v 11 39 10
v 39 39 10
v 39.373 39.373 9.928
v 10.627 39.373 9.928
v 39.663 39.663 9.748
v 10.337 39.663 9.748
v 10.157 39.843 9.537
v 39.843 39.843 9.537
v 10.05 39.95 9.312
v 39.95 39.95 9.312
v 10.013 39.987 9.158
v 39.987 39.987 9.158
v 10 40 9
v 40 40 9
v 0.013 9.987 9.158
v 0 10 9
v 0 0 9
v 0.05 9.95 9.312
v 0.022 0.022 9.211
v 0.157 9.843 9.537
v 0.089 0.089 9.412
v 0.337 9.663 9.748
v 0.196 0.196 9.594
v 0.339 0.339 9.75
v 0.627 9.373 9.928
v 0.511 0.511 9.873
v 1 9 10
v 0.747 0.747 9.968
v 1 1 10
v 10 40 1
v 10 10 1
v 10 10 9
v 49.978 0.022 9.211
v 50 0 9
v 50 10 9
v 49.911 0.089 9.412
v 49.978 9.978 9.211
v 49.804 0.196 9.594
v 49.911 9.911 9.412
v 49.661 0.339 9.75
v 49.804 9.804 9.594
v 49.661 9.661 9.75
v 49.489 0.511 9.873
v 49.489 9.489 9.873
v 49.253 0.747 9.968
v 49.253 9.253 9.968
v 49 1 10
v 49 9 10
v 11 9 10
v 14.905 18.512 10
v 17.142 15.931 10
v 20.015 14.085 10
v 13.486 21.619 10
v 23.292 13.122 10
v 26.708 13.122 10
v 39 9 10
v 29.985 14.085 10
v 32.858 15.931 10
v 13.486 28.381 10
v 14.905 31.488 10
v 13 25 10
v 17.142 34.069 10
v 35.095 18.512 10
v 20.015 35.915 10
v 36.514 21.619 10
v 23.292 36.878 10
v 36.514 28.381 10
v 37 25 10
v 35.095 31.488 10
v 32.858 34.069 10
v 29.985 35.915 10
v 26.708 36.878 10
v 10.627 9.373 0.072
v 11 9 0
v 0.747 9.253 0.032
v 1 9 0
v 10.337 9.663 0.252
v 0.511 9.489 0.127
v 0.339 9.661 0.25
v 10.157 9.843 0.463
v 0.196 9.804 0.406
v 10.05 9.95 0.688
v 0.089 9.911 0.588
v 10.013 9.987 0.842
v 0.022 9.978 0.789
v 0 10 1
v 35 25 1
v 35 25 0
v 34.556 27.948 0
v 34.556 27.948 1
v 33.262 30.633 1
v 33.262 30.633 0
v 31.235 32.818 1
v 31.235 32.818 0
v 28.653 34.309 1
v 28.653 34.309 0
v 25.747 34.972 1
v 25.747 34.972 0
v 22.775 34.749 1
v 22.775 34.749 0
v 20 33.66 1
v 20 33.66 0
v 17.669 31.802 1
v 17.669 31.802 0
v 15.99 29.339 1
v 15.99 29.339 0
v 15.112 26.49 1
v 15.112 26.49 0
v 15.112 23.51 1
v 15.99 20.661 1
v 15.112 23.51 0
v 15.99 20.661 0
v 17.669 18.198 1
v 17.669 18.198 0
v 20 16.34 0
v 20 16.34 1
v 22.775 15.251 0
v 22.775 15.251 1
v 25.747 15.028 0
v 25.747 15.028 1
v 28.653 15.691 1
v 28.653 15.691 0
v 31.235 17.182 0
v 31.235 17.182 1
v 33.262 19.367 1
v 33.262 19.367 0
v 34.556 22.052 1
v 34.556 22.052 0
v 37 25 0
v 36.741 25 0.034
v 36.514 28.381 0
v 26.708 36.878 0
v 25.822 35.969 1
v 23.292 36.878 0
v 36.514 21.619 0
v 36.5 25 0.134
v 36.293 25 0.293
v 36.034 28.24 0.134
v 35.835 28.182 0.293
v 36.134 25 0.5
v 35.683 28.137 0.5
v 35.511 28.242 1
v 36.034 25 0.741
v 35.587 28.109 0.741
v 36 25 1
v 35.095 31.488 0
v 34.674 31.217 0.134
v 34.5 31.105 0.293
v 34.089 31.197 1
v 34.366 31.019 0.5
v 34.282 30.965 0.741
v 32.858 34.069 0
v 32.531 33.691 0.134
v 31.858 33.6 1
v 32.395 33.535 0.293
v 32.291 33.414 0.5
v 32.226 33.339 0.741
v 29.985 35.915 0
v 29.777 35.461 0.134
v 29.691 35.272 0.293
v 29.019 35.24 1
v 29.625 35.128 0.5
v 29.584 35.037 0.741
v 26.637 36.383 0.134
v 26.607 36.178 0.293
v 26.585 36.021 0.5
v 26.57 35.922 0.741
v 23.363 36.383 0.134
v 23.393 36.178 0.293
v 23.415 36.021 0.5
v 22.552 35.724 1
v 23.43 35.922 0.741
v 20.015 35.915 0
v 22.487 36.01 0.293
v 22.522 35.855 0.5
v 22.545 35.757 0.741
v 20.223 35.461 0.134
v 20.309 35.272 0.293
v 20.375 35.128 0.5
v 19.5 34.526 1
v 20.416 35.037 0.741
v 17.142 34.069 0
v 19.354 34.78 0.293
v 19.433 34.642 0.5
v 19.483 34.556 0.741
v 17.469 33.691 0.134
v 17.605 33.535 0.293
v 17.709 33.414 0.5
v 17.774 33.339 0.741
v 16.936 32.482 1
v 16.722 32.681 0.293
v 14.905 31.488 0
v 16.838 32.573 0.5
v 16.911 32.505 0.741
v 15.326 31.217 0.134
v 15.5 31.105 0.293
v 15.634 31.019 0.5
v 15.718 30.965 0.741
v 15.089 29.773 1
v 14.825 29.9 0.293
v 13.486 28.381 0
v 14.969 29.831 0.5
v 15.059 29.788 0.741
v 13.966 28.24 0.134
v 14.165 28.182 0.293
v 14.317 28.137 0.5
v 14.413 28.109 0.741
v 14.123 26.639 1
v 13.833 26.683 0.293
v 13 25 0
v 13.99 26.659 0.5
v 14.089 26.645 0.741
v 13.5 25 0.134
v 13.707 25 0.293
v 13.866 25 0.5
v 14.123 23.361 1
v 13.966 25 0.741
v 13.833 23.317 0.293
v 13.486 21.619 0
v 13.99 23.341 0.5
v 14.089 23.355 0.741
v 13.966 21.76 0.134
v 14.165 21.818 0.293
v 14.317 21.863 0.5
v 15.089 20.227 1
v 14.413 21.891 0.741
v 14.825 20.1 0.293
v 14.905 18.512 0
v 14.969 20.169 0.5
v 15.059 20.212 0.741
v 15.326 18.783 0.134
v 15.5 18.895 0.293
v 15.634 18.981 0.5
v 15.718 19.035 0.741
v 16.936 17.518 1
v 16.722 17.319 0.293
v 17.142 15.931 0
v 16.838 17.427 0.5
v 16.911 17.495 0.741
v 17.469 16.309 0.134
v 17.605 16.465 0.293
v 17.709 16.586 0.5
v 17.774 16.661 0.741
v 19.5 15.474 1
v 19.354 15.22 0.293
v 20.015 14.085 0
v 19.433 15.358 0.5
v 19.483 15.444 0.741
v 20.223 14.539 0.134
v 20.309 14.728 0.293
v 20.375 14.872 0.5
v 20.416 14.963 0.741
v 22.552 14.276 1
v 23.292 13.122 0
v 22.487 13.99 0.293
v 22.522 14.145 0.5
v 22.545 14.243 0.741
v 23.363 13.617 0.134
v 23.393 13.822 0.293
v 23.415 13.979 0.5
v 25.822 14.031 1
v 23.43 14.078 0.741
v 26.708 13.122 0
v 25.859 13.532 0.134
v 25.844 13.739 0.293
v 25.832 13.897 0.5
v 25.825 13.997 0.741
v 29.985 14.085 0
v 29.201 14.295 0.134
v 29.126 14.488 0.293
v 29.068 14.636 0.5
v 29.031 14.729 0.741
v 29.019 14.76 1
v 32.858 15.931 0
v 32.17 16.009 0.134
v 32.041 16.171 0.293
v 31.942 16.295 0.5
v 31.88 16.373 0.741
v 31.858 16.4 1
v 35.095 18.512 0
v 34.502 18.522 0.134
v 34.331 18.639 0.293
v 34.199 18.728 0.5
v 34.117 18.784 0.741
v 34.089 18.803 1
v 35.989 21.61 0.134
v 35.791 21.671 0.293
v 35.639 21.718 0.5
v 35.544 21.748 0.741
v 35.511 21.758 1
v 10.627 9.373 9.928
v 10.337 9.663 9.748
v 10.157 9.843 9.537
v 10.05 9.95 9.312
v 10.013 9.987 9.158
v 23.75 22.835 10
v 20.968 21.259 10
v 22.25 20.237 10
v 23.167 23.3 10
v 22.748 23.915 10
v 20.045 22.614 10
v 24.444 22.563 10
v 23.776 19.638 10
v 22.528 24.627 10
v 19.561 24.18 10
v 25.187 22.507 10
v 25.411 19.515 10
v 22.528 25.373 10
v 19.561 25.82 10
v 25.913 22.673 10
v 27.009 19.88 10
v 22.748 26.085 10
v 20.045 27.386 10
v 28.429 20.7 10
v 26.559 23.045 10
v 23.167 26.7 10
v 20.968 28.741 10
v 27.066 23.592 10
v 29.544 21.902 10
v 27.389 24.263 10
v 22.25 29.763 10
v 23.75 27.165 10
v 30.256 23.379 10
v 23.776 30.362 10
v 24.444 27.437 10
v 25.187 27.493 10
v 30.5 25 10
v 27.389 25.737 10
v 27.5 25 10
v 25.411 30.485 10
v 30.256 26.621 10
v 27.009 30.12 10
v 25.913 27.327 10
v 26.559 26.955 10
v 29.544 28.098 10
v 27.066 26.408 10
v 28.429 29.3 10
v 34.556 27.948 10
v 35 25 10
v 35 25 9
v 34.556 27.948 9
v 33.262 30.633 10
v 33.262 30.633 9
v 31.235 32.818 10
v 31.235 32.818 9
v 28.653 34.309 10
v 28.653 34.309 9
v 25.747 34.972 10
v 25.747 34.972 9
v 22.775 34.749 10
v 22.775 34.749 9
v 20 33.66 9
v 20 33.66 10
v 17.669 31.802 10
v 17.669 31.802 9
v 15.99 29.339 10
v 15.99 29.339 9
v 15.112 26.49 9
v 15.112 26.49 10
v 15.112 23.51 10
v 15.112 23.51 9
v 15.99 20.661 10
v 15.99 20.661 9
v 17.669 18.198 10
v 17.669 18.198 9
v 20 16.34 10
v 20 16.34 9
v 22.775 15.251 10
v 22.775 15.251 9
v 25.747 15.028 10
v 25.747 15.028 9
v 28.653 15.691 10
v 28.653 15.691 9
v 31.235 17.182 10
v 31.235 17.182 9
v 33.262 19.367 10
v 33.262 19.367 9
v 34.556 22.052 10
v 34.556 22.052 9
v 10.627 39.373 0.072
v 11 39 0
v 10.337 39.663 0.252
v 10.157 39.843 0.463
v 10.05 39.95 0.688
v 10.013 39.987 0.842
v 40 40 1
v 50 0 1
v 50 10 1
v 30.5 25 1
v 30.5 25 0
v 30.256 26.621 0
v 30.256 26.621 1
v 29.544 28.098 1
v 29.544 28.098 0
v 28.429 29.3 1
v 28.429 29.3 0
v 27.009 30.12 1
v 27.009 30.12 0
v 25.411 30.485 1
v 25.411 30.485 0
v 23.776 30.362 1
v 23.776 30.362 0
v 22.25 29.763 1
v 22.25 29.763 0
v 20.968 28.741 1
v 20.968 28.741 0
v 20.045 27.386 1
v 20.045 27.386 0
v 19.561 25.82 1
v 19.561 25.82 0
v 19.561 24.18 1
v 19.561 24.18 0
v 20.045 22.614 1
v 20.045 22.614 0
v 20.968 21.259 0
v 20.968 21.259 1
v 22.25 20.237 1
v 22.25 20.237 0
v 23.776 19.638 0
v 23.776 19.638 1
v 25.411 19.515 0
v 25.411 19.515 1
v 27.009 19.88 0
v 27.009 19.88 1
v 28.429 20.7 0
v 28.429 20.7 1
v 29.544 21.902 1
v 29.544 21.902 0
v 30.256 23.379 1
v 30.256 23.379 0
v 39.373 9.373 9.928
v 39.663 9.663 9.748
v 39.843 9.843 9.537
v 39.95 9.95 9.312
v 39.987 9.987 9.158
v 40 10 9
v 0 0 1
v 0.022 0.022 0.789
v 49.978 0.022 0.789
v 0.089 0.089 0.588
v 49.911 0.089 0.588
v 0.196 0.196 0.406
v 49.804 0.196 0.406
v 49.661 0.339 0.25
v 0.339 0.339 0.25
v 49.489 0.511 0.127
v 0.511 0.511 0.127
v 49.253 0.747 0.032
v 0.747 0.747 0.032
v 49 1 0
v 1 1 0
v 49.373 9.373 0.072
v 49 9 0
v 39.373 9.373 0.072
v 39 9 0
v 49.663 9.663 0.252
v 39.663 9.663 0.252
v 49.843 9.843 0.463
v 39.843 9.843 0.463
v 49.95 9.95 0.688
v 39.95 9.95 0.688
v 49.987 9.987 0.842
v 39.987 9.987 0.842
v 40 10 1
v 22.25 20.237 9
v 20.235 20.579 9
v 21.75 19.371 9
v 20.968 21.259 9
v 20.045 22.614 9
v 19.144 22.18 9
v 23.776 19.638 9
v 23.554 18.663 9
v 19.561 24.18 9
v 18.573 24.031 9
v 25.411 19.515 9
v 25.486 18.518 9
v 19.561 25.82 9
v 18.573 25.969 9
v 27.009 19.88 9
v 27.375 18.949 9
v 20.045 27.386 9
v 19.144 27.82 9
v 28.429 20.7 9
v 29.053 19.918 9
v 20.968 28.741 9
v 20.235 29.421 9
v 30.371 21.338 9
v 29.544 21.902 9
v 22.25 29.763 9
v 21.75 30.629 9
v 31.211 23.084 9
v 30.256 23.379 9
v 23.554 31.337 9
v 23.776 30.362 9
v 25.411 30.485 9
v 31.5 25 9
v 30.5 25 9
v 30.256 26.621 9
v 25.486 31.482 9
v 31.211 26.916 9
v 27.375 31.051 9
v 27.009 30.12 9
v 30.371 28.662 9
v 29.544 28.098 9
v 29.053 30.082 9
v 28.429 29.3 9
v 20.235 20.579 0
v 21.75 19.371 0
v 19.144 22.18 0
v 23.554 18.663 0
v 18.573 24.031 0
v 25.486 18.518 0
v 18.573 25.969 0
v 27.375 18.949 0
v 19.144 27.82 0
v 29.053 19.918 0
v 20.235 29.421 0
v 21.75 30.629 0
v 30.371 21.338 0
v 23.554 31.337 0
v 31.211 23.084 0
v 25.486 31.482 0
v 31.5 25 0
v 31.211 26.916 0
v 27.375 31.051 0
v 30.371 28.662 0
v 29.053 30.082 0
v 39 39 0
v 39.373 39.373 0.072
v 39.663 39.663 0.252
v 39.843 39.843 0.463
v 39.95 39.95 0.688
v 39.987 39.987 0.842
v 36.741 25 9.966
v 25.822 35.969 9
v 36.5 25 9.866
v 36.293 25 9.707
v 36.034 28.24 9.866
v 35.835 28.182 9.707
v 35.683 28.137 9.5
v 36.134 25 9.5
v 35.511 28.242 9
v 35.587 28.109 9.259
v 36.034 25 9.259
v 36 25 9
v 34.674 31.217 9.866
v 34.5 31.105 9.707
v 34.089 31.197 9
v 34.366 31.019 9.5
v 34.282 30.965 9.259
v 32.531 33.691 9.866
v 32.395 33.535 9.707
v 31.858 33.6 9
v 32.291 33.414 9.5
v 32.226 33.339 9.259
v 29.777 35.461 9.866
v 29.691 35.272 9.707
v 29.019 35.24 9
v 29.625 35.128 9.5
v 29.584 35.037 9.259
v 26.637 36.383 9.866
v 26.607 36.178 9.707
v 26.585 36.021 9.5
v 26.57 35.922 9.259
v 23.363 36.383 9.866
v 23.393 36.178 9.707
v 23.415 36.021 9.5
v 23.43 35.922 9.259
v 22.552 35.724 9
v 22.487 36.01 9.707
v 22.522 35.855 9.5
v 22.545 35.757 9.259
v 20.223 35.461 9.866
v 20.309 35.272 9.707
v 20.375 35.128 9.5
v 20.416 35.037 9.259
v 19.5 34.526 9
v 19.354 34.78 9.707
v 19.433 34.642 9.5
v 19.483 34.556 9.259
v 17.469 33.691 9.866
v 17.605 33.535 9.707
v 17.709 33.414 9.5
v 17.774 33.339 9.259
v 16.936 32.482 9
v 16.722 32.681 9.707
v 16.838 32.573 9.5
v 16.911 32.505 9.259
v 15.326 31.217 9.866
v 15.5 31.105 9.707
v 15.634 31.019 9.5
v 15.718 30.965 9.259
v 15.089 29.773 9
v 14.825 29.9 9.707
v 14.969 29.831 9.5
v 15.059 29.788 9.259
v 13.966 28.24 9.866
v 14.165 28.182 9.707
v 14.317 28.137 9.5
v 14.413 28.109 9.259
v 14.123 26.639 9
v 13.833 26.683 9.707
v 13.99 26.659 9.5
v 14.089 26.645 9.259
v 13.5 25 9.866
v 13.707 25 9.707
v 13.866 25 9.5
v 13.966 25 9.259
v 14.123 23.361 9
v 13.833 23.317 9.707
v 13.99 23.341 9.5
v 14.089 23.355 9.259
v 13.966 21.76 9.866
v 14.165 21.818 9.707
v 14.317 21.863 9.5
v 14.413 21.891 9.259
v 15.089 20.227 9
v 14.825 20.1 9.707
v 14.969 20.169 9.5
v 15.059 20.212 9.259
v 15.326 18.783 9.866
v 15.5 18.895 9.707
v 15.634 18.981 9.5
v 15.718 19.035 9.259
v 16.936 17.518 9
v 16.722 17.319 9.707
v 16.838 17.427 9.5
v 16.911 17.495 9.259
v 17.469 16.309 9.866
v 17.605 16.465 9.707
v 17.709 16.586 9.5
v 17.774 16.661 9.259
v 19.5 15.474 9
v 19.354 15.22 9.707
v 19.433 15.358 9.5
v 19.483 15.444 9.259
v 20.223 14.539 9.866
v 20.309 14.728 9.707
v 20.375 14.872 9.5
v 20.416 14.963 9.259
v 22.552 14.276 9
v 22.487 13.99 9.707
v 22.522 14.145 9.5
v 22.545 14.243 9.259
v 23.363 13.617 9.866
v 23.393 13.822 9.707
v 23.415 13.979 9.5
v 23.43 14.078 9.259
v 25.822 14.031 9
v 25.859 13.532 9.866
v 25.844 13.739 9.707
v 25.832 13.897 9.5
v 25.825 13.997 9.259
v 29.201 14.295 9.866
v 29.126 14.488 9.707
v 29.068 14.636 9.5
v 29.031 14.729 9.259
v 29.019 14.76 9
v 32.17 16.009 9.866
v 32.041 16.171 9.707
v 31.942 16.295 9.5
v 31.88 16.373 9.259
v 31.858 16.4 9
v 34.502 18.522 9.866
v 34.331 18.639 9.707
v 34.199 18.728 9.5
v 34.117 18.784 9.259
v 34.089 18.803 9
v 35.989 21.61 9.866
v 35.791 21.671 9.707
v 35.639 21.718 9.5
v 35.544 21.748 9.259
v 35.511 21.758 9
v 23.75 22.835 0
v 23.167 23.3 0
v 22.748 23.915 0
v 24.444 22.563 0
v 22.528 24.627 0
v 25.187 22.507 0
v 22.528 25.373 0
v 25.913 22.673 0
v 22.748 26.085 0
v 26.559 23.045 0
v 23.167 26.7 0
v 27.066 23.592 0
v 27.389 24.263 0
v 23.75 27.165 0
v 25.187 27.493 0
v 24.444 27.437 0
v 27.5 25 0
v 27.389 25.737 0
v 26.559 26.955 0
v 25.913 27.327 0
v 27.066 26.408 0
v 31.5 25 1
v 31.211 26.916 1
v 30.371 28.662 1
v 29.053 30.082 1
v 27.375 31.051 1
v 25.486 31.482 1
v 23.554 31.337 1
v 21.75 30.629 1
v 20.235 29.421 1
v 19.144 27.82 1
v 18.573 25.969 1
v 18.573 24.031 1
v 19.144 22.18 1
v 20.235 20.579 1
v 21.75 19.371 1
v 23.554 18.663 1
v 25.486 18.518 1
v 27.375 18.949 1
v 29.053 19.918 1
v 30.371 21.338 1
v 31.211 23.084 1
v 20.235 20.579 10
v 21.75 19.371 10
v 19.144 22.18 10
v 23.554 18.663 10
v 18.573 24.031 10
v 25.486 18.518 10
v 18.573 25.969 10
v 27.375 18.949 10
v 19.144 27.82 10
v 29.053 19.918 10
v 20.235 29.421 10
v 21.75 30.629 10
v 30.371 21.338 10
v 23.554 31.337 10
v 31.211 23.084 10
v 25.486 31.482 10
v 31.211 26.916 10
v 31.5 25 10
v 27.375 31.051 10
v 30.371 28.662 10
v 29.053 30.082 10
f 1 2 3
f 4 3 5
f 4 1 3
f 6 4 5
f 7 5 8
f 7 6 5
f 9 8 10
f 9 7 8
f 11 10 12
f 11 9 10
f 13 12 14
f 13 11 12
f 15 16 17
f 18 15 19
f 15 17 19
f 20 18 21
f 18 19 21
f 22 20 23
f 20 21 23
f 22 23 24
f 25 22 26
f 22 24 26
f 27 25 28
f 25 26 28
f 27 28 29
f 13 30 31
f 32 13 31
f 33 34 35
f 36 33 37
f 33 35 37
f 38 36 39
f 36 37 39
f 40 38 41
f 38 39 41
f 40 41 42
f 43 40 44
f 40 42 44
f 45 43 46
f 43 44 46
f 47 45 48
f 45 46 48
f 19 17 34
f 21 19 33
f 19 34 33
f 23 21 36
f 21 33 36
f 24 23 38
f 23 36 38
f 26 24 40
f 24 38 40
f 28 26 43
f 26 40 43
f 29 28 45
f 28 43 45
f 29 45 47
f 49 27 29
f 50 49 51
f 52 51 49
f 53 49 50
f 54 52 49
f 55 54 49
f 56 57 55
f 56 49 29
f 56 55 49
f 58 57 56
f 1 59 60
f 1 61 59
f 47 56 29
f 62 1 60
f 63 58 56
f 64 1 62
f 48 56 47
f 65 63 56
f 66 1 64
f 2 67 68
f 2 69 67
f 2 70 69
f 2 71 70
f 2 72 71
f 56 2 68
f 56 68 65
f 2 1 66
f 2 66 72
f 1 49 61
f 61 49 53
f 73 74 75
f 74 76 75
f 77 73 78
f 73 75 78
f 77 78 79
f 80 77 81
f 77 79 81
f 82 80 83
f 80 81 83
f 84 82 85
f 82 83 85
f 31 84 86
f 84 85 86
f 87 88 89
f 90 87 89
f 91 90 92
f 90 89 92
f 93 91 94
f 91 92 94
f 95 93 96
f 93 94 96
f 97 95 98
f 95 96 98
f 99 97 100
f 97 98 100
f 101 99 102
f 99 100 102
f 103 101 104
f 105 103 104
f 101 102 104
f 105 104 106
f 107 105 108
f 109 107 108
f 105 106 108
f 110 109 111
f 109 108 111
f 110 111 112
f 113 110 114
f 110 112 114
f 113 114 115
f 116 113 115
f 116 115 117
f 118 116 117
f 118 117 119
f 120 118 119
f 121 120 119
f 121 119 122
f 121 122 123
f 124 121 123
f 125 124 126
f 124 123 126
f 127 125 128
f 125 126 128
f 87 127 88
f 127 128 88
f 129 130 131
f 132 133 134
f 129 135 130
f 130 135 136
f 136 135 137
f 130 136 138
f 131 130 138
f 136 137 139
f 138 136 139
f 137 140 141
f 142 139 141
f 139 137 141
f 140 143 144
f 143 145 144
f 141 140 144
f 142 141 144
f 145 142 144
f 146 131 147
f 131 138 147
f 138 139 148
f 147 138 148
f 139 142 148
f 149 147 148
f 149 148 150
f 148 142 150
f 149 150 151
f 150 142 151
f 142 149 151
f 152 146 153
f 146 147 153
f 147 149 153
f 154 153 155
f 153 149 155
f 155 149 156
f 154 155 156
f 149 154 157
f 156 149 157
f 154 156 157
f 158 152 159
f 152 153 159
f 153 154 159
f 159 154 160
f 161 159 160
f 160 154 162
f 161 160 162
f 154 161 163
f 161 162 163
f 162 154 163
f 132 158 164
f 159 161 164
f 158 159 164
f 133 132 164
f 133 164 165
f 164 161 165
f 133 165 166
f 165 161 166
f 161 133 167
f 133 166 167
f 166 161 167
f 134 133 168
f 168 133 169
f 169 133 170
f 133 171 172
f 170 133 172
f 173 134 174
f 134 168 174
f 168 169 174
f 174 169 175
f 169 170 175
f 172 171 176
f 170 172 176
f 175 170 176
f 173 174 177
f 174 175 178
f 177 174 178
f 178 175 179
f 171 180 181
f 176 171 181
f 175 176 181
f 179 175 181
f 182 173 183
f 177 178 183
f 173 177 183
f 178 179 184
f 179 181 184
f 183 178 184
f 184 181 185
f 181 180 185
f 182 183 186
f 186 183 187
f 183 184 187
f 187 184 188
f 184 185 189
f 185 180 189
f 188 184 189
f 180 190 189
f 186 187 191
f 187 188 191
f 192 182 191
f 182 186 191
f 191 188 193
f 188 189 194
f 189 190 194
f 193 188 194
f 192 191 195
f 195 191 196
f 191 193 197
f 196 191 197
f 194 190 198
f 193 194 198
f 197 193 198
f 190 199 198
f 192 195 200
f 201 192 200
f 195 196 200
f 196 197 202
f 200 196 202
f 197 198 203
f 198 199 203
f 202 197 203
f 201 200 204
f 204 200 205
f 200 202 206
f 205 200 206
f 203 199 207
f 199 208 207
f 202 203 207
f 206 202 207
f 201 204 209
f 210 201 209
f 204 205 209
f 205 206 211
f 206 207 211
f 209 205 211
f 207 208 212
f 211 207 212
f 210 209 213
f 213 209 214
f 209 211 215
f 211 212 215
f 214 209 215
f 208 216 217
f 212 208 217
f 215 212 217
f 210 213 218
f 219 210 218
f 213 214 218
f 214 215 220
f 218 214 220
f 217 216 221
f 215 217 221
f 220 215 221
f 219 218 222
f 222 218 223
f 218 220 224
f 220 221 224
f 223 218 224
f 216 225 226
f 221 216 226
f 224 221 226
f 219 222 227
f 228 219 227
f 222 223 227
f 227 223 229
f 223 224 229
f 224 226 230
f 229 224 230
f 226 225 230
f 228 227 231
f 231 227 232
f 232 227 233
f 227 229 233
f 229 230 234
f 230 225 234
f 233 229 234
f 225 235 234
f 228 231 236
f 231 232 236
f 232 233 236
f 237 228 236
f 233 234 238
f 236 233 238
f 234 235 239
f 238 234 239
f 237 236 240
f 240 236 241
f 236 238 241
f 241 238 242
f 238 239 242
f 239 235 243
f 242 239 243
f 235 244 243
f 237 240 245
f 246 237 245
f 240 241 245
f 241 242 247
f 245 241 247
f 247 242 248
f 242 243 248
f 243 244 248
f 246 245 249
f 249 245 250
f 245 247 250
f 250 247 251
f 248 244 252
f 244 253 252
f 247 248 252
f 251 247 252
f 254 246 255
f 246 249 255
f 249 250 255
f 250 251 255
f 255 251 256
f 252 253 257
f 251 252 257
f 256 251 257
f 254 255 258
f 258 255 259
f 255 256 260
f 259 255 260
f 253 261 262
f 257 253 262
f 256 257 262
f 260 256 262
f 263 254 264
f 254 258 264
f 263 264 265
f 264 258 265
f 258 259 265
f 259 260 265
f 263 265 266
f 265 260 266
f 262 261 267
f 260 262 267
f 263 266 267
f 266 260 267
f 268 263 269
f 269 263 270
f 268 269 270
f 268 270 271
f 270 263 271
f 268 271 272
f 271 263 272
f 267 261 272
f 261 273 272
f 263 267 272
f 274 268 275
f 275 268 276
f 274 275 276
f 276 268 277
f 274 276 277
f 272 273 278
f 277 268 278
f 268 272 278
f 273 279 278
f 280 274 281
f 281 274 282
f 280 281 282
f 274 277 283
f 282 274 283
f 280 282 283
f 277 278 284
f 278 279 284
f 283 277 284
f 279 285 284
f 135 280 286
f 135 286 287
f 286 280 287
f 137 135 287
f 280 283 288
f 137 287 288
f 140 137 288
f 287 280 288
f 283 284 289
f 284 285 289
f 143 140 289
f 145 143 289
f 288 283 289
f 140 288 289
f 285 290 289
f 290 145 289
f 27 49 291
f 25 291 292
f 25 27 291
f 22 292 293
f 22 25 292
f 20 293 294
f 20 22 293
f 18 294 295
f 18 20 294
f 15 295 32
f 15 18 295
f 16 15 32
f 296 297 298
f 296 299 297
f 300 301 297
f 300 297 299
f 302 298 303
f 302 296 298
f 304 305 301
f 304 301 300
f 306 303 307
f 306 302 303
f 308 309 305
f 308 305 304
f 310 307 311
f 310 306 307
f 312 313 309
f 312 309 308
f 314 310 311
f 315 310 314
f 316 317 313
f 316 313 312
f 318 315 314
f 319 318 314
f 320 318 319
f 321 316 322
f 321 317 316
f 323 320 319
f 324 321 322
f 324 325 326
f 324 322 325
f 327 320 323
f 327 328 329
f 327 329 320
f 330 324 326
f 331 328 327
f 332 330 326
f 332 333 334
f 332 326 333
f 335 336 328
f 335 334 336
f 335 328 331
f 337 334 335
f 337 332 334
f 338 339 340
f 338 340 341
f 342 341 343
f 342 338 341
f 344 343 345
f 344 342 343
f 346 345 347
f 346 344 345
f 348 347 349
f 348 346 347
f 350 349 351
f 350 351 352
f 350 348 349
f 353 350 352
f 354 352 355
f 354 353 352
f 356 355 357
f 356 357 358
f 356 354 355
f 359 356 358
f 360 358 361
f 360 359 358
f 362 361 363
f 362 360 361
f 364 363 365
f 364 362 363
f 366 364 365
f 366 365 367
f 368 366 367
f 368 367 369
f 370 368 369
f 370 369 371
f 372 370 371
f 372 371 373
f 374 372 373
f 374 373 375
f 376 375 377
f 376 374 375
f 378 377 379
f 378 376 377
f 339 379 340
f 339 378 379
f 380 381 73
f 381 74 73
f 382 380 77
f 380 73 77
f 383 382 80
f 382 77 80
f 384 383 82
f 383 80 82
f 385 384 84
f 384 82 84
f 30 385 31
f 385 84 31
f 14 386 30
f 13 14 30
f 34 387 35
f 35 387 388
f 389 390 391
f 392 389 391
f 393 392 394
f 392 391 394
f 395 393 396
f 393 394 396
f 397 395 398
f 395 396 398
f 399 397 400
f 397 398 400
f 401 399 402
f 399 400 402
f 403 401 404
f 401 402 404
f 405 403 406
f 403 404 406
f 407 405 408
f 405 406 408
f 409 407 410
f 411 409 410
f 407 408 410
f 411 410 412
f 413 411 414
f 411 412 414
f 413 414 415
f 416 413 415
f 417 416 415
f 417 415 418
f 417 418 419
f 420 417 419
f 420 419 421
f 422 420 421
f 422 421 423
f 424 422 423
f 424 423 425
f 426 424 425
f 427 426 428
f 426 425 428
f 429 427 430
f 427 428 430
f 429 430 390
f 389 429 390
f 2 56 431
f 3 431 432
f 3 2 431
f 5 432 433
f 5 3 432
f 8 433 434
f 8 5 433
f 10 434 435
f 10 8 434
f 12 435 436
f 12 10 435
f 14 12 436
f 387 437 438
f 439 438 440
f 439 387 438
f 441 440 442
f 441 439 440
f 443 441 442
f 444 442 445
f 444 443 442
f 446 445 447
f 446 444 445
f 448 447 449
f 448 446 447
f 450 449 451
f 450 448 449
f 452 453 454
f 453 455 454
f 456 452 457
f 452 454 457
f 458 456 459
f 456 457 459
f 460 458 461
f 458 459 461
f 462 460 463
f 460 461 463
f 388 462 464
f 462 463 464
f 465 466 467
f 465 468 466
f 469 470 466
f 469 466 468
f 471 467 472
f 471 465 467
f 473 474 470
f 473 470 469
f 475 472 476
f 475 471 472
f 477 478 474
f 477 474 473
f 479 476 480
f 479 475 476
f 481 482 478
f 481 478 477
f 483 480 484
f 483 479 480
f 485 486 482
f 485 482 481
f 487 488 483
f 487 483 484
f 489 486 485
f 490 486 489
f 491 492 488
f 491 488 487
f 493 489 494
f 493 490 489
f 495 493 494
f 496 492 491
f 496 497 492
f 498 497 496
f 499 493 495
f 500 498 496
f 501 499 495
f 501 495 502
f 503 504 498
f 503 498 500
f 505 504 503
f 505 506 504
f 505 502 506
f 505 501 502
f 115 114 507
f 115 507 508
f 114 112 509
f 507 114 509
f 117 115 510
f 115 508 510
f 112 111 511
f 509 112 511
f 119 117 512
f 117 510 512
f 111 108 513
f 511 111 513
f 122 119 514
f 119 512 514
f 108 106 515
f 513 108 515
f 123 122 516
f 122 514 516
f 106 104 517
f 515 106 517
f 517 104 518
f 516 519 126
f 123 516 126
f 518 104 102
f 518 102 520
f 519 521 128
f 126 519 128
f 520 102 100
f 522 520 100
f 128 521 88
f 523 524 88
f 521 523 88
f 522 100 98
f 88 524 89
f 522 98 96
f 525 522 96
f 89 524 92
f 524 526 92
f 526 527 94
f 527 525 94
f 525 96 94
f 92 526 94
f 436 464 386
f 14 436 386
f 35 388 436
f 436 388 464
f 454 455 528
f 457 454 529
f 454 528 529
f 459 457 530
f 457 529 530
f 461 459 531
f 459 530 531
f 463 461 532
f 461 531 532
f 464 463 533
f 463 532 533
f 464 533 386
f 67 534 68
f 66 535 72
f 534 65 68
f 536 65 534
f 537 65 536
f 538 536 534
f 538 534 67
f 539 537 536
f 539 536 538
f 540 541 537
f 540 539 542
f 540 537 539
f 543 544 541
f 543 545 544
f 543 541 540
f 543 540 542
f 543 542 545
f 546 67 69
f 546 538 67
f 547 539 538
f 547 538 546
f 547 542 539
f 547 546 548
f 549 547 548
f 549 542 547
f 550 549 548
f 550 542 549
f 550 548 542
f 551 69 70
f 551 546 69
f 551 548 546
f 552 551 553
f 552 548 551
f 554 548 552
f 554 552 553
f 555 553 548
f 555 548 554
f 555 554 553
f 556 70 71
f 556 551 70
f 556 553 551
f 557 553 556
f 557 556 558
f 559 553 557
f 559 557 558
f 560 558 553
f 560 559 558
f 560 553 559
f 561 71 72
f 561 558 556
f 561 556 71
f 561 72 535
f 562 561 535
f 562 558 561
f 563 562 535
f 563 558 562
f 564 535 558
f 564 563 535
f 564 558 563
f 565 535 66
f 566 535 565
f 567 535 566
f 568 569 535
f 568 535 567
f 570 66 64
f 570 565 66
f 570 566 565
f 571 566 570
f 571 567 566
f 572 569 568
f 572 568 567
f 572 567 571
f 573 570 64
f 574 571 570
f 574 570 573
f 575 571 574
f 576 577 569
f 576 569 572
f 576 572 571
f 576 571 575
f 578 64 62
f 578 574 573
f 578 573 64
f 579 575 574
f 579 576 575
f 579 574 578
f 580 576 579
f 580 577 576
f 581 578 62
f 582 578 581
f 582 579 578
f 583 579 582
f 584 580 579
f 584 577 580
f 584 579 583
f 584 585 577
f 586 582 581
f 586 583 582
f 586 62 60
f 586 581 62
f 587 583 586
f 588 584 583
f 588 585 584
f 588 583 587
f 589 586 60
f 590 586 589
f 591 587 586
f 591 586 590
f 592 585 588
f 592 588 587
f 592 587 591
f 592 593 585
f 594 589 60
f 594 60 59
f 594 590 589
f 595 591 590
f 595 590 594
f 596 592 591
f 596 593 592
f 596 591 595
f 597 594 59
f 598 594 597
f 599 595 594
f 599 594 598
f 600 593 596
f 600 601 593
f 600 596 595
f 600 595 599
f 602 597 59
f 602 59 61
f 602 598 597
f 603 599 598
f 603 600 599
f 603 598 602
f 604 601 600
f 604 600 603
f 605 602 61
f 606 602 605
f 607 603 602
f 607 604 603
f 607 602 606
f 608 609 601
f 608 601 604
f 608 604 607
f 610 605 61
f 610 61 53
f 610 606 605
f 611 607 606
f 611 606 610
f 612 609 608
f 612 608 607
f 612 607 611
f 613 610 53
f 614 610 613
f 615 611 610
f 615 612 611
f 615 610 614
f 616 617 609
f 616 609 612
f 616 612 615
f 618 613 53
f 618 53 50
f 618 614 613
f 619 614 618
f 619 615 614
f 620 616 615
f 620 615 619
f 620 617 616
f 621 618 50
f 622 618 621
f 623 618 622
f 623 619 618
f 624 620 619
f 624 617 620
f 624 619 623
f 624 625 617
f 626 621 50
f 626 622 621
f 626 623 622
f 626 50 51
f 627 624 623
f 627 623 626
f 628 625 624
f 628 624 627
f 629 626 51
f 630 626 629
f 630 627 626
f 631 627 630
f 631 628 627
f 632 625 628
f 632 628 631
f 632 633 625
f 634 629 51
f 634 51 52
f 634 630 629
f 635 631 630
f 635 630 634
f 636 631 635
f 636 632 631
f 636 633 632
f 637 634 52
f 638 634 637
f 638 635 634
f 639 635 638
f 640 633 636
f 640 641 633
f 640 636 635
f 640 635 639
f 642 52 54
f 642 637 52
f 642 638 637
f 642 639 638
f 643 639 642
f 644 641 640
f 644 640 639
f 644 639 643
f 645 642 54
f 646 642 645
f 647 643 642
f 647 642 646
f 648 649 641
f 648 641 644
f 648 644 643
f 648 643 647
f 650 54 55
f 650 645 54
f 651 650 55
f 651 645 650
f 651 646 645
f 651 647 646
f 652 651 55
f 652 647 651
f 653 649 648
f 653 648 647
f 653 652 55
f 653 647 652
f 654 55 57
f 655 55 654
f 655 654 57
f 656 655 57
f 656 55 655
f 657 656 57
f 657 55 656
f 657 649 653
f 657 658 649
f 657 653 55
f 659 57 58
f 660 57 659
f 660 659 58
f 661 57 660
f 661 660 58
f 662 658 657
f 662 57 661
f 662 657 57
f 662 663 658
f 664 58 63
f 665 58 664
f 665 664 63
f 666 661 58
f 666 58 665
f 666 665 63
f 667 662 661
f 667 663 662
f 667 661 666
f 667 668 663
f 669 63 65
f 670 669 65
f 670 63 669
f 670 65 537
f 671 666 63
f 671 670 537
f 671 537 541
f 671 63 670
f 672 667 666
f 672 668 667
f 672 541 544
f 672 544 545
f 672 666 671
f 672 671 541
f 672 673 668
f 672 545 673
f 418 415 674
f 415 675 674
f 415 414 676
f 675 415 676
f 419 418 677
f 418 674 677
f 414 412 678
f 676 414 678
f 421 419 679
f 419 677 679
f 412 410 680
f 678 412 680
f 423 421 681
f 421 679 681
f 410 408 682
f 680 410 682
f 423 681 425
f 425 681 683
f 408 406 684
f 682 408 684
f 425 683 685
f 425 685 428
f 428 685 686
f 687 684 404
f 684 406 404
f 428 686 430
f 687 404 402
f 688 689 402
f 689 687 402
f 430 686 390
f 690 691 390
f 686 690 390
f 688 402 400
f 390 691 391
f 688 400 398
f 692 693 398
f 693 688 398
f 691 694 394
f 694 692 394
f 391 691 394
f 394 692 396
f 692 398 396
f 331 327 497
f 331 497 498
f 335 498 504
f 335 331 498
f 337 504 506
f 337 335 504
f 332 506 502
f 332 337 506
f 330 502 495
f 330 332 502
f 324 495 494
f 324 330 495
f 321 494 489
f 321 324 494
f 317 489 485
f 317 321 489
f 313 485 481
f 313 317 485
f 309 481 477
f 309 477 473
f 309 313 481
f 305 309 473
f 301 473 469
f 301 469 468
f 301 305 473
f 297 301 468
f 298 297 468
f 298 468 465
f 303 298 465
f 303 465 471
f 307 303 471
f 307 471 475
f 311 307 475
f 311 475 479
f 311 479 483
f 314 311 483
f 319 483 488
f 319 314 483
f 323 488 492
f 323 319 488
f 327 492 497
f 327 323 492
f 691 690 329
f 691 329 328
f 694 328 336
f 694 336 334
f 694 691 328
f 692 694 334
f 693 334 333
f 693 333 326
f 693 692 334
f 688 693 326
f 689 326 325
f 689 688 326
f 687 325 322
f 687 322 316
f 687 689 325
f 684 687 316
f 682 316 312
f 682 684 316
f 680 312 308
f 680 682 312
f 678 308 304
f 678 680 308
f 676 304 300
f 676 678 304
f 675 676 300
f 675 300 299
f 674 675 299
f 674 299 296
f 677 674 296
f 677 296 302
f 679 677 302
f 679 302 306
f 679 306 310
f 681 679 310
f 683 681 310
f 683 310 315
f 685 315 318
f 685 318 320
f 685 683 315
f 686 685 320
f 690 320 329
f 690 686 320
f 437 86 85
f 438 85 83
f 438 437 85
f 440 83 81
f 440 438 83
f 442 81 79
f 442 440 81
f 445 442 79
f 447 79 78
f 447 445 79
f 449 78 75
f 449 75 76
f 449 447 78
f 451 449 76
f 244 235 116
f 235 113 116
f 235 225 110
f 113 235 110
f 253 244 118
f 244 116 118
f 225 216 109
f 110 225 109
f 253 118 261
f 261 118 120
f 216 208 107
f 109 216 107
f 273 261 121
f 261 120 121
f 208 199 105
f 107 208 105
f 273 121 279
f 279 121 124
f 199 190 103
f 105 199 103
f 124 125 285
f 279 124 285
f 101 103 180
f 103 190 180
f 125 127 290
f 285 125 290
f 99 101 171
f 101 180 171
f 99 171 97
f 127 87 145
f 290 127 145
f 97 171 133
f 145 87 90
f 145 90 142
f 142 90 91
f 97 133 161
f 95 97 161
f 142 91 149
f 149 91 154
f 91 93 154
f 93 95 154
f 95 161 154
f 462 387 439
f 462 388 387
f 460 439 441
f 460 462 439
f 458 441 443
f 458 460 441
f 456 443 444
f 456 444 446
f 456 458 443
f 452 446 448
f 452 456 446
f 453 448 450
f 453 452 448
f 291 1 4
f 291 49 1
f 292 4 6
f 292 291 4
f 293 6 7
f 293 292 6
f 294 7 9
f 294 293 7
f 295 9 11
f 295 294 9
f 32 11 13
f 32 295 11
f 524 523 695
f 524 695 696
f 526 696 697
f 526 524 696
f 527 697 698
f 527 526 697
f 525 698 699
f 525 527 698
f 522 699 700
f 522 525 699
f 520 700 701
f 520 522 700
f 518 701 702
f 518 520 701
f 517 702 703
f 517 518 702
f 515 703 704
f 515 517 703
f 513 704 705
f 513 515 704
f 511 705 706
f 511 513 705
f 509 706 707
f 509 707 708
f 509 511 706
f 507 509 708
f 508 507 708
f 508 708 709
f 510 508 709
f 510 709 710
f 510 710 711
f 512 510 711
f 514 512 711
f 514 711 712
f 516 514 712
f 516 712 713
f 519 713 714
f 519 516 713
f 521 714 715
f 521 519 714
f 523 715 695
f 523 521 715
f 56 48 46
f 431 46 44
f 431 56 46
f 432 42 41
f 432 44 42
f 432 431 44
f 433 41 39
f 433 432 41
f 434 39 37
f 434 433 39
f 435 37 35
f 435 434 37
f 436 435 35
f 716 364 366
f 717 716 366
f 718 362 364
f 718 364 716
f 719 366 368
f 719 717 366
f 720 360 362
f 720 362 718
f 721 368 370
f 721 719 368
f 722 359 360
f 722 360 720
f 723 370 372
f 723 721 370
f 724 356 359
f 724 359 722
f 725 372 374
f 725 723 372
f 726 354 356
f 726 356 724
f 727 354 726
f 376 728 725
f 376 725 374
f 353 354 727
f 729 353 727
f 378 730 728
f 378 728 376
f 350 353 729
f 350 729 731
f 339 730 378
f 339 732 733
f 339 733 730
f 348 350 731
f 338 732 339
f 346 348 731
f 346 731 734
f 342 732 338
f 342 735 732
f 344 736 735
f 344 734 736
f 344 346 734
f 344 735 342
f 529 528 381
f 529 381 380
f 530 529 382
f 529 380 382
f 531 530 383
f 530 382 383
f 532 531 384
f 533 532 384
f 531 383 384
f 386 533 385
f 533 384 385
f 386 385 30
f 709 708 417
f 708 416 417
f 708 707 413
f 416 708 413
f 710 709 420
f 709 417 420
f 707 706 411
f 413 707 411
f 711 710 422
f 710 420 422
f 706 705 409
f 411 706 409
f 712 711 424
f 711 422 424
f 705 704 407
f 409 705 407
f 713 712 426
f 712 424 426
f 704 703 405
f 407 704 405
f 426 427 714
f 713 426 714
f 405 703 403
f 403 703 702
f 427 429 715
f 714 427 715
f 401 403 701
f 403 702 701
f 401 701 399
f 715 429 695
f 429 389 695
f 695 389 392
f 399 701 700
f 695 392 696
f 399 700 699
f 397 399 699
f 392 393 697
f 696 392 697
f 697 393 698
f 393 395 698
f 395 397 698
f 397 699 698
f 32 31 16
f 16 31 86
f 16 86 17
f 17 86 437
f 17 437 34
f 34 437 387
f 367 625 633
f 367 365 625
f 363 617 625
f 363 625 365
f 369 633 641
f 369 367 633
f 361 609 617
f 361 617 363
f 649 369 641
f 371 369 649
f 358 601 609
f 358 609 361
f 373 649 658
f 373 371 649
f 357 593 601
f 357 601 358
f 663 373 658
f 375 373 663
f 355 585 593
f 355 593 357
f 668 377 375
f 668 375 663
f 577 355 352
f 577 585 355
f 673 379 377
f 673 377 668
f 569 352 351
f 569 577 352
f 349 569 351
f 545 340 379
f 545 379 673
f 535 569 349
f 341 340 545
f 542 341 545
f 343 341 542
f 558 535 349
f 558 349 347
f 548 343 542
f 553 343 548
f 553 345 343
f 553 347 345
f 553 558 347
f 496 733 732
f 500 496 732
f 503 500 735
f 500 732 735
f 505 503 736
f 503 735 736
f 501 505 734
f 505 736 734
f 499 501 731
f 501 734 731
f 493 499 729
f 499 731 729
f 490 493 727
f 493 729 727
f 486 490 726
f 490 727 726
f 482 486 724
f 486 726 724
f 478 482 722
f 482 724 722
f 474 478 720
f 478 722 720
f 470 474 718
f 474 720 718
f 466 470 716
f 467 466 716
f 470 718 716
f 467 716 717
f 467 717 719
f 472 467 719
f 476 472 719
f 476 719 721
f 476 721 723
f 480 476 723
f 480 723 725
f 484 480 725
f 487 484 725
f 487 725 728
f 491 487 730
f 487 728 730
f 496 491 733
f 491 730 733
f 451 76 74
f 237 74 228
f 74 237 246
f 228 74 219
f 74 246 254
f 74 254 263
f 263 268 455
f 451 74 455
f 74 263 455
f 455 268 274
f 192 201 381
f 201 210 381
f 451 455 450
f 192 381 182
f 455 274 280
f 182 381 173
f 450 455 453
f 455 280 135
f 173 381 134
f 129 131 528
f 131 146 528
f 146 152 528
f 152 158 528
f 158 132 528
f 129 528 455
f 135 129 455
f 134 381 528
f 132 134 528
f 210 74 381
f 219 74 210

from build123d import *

# Parameters (mm, degrees)
SKETCH1_R           = 2.5
BOSS_EXTRUDE1_DEPTH = 10
SKETCH2_R           = 11
SKETCH2_R_2         = 10
SKETCH2_R_3         = 6.5
SKETCH2_R_4         = 5.5
CUT_EXTRUDE1_DEPTH  = 1
FILLET1_R           = 1


with BuildPart() as part:
    # Sketch1 → Boss-Extrude1 (new body)
    with BuildSketch(Plane.XY):
        Polygon((0, 0), (50, 0), (50, 10), (40, 10), (40, 40), (10, 40), (10, 10), (0, 10), align=None)
        with Locations((25, 25)):
            Circle(SKETCH1_R, mode=Mode.SUBTRACT)
    extrude(amount=BOSS_EXTRUDE1_DEPTH)

    # Sketch2 → Cut-Extrude1 (cut)
    # profile 1 of 2: a face of its own
    with BuildSketch(Plane.XY.offset(10)):
        with Locations((25, 25)):
            Circle(SKETCH2_R)
        with Locations((25, 25)):
            Circle(SKETCH2_R_2, mode=Mode.SUBTRACT)
    # profile 2 of 2: a face of its own
    with BuildSketch(Plane.XY.offset(10)):
        with Locations((25, 25)):
            Circle(SKETCH2_R_3)
        with Locations((25, 25)):
            Circle(SKETCH2_R_4, mode=Mode.SUBTRACT)
    cut_extrude1 = extrude(amount=-CUT_EXTRUDE1_DEPTH, mode=Mode.SUBTRACT)

    # Mirror1: Cut-Extrude1 across plane
    add(cut_extrude1.mirror(Plane.XY.offset(5)), mode=Mode.SUBTRACT)

    # Fillet1
    fillet1_edges = [part.edges().sort_by_distance(p)[0] for p in [
        (45, 10, 0),
        (50, 5, 0),
        (25, 0, 0),
        (0, 5, 0),
        (50, 5, 10),
        (45, 10, 10),
        (40, 25, 10),
        (25, 40, 10),
        (10, 25, 10),
        (14, 25, 10),
        (5, 10, 10),
        (14, 25, 0),
        (0, 5, 10),
        (5, 10, 0),
        (25, 0, 10),
        (10, 25, 0),
        (25, 40, 0),
        (40, 25, 0),
    ]]
    fillet(fillet1_edges, radius=FILLET1_R - 0.0001)  # a hair under: the kernel refuses the full size


solid = part.part
